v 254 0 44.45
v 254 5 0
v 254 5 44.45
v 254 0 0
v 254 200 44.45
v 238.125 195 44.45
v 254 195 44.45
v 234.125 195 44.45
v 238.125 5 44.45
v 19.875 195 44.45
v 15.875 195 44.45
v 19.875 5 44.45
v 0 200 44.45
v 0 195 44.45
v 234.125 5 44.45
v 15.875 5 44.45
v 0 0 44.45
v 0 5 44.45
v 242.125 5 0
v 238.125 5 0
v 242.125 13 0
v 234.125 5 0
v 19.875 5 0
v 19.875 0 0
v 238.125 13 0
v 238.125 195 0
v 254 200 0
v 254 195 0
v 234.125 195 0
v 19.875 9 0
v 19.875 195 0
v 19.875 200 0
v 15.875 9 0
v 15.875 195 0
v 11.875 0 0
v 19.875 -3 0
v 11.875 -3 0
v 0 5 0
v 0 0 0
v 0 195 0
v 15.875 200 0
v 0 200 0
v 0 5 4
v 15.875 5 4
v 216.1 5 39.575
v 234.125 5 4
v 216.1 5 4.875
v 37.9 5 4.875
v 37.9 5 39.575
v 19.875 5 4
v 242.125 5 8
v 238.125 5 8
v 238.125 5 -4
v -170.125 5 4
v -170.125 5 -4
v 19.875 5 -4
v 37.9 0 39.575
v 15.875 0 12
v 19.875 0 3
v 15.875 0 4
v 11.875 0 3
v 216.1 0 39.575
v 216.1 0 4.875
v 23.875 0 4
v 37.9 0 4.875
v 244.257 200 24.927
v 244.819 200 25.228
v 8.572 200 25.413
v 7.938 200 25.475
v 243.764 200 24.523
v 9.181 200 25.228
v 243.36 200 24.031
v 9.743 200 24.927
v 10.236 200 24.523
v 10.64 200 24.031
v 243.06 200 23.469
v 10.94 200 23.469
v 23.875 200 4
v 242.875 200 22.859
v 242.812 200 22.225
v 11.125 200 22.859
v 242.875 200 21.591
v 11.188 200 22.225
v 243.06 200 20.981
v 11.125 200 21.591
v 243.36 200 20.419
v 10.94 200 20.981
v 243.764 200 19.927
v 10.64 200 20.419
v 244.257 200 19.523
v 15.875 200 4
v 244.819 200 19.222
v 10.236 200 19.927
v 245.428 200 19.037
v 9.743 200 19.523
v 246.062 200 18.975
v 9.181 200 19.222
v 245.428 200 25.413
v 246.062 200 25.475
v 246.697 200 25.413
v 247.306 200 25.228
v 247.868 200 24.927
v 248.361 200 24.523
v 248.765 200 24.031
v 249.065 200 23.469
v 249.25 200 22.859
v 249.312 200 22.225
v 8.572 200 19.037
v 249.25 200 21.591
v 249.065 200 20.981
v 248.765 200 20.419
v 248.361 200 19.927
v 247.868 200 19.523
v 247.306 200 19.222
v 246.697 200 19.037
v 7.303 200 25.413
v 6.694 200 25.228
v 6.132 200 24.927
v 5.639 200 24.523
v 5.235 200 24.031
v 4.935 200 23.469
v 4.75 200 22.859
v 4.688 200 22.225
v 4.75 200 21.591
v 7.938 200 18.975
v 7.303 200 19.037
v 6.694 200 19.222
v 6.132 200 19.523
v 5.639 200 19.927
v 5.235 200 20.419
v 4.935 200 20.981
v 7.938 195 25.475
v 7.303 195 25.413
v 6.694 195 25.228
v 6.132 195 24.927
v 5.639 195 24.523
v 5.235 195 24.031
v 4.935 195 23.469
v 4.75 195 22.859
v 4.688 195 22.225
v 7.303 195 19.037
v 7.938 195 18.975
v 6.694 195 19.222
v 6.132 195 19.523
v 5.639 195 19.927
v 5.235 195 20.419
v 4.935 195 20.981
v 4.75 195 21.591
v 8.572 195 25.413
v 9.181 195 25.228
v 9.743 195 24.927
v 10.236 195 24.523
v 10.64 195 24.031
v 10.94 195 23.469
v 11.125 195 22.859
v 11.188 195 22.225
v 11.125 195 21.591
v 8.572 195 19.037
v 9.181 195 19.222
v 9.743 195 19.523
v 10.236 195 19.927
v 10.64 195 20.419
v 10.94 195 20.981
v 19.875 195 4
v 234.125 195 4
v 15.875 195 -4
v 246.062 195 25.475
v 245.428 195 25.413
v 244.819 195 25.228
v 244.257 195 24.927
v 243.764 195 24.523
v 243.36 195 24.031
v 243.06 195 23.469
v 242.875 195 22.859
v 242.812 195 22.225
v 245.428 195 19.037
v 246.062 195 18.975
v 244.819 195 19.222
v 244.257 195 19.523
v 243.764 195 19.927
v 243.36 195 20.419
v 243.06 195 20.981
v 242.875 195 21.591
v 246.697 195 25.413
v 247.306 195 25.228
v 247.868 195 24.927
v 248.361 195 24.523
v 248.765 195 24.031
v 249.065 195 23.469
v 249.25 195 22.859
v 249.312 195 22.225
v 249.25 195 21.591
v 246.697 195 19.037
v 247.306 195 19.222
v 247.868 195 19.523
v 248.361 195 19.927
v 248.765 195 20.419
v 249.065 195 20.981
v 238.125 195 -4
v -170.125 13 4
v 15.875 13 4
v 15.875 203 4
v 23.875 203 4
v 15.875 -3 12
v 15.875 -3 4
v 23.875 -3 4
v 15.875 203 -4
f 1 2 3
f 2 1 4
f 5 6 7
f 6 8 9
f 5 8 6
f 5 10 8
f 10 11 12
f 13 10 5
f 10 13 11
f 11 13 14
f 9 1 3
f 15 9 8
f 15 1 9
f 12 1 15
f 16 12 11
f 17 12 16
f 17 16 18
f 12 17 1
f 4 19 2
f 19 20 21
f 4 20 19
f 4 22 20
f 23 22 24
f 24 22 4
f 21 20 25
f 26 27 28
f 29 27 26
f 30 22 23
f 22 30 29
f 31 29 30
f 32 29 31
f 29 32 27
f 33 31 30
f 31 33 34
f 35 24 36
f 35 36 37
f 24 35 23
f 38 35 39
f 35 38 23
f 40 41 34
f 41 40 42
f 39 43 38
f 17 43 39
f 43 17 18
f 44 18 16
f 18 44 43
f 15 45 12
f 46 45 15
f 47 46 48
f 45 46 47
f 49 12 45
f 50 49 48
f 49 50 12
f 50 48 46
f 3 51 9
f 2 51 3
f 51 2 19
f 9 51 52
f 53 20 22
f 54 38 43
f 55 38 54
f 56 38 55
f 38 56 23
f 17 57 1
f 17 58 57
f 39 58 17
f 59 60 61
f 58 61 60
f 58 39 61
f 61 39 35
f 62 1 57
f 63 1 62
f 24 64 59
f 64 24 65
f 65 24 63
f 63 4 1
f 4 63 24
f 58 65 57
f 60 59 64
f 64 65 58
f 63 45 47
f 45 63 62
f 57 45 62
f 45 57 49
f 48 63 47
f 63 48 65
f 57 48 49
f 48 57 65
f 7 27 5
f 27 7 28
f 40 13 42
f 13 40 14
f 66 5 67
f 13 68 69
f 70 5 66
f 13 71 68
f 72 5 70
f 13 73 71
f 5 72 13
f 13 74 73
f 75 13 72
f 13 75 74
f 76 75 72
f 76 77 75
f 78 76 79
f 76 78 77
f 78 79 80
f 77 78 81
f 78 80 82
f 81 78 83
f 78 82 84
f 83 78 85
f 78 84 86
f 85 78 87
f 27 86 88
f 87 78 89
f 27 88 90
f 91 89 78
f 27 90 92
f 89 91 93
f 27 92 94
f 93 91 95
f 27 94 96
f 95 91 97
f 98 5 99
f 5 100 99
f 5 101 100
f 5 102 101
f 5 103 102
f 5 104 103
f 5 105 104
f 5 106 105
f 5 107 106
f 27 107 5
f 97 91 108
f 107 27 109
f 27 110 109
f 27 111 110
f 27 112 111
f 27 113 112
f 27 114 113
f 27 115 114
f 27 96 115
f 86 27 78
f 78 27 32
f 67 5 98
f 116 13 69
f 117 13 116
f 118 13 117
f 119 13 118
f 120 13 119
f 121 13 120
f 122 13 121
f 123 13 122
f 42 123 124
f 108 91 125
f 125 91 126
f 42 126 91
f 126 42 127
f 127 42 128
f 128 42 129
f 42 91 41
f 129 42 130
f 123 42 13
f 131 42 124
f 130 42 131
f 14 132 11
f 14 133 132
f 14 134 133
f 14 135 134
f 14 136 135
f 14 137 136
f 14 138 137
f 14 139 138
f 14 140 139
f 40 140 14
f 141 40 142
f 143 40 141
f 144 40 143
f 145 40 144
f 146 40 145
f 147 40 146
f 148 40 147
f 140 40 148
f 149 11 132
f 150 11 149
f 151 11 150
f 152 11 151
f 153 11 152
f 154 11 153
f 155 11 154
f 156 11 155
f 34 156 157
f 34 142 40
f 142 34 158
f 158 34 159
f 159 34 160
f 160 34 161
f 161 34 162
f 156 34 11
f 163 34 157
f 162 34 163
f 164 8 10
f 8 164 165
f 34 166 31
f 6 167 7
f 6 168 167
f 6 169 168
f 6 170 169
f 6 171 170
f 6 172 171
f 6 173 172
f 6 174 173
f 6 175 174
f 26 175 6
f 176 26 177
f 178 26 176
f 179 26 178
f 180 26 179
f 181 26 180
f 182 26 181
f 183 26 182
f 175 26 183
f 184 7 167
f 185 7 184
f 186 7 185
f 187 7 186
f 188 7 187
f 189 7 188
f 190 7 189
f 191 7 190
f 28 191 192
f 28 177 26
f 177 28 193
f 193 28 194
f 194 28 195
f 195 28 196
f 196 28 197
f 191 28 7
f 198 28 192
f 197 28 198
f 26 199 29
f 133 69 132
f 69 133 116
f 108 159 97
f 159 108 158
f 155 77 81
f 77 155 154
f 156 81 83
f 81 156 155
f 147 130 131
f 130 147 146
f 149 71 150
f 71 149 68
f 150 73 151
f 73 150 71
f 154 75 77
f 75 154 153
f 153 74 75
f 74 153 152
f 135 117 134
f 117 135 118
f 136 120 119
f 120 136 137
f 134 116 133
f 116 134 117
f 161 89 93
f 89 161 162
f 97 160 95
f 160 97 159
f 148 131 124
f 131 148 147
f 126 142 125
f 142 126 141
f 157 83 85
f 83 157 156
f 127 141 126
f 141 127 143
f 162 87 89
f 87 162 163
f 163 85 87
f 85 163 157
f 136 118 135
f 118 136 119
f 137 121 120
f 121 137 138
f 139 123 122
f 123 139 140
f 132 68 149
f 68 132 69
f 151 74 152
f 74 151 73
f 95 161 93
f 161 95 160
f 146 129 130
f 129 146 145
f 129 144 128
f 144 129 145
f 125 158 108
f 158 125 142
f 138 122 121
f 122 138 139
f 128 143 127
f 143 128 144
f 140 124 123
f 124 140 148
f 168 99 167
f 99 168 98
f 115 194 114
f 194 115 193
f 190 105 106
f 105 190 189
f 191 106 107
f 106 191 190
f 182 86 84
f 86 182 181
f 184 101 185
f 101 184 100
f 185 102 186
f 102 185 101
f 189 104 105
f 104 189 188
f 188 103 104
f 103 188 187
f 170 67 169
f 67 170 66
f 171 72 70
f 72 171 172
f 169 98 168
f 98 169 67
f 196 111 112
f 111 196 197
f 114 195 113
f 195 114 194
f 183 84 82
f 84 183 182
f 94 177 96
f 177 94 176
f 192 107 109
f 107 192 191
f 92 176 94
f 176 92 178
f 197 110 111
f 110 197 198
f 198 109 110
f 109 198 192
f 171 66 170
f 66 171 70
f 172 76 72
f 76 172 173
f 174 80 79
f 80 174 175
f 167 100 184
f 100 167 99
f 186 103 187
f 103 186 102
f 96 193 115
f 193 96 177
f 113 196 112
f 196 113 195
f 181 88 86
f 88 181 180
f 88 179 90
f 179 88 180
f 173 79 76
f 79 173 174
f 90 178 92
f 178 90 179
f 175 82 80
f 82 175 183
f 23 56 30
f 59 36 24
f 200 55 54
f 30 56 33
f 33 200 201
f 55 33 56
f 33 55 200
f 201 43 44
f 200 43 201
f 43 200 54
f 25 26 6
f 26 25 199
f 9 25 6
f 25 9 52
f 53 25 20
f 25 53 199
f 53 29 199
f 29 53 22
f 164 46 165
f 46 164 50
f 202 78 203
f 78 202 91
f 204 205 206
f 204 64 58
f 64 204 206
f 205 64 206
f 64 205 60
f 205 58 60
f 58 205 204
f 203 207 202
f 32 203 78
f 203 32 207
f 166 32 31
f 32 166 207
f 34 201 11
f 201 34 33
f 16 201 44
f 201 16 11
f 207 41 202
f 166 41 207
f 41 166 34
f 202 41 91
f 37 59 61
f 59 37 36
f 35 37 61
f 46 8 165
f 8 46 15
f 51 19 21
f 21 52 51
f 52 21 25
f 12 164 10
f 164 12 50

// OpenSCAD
// ============================================================
// Lenovo ThinkCentre M93 Tiny — 10" Rack Mount (1U, 4-post)
// Single print, no supports required (print faceplate-face-down)
// ============================================================

// --- Rack dimensions ---
rack_width         = 254.0;   // 10" rack total panel width
rack_usable_width  = 222.25;  // usable width between posts
rack_1u_height     = 44.45;   // 1U panel height
post_depth         = 200.0;   // front post face to rear post face

// --- M93 Tiny dimensions (on its side) ---
m93_w              = 177.8;   // width of unit
m93_h              = 34.3;    // height of unit (sitting on side)
m93_d              = 182.0;   // depth of unit

// --- Wall / structure thicknesses ---
wall_t             = 4.0;     // general wall / floor thickness
face_t             = 5.0;     // faceplate thickness
rear_t             = 5.0;     // rear crossbar thickness
gusset_r           = 8.0;     // corner gusset radius

// --- Mounting holes ---
m6_hole_d          = 6.5;     // M6 clearance hole diameter
// Rack ear width = (rack_width - rack_usable_width) / 2 = 15.875mm each side
ear_w              = (rack_width - rack_usable_width) / 2;  // 15.875
// Hole centred in ear, centred vertically in 1U
hole_x             = ear_w / 2;                             // 7.94 from panel edge
hole_y             = rack_1u_height / 2;                    // 22.23 from bottom

// --- Derived inner cavity ---
// Inner cavity sits centred left-right within usable width
// Side walls sit on the floor, floor spans usable width
inner_w            = rack_usable_width - 2 * wall_t;        // 214.25
inner_h            = rack_1u_height - wall_t;               // 40.45 (open top)
// Tray depth from back of faceplate to back of rear crossbar
tray_d             = post_depth - face_t - rear_t;          // 190mm inner run

// M93 sits centred left-right, on the floor
m93_offset_x       = (inner_w - m93_w) / 2;                // side gap each side
m93_offset_z       = 0;                                     // sits on floor
// M93 front face flush with back of faceplate
m93_offset_y       = 0;

// ============================================================
// MODULES
// ============================================================

module gusset_fillet(length, r) {
    // 45-degree triangular gusset along Y axis
    // Place at corner, will be differenced out to round internal corners
    translate([0, 0, 0])
    rotate([90, 0, 0])
    linear_extrude(height = length)
    polygon(points = [[0, 0], [r, 0], [0, r]]);
}

module rack_ear(side) {
    // side: 0 = left, 1 = right
    mirror_x = (side == 1) ? -1 : 1;
    translate([side == 1 ? rack_width - ear_w : 0, 0, 0])
    difference() {
        cube([ear_w, face_t, rack_1u_height]);
        // M6 mounting hole
        translate([hole_x, face_t / 2, hole_y])
        rotate([90, 0, 0])
        cylinder(d = m6_hole_d, h = face_t + 1, center = true, $fn = 32);
    }
}

module rear_crossbar() {
    translate([0, post_depth - rear_t, 0])
    difference() {
        cube([rack_width, rear_t, rack_1u_height]);
        // Left M6 hole
        translate([hole_x, rear_t / 2, hole_y])
        rotate([90, 0, 0])
        cylinder(d = m6_hole_d, h = rear_t + 1, center = true, $fn = 32);
        // Right M6 hole
        translate([rack_width - hole_x, rear_t / 2, hole_y])
        rotate([90, 0, 0])
        cylinder(d = m6_hole_d, h = rear_t + 1, center = true, $fn = 32);
    }
}

module faceplate() {
    // Faceplate spans full rack width, sits at Y=0
    // Cutout: tight rectangle for M93 front face, centred left-right and vertically
    cutout_w = m93_w + 0.4;  // 0.4mm clearance each side
    cutout_h = m93_h + 0.4;
    cutout_x = (rack_width - cutout_w) / 2;
    cutout_z = (rack_1u_height - cutout_h) / 2;

    difference() {
        // Solid faceplate
        cube([rack_width, face_t, rack_1u_height]);
        // M93 front I/O cutout
        translate([cutout_x, -0.1, cutout_z])
        cube([cutout_w, face_t + 0.2, cutout_h]);
        // Left ear hole (already in rack_ear but faceplate is separate solid here
        // — holes handled in rack_ear module which is unioned)
    }
}

module side_wall(side) {
    // side: 0 = left, 1 = right
    // Walls run from back of faceplate to front of rear crossbar
    wall_run = post_depth - face_t - rear_t;  // 190mm
    x_pos = (side == 0) ? ear_w : rack_width - ear_w - wall_t;
    translate([x_pos, face_t, 0])
    cube([wall_t, wall_run, rack_1u_height]);
}

module floor_panel() {
    // Floor spans usable width, runs full tray depth (faceplate back to rear crossbar front)
    floor_run = post_depth - face_t - rear_t;
    translate([ear_w, face_t, 0])
    cube([rack_usable_width, floor_run, wall_t]);
}

module gussets() {
    gusset_run = post_depth - face_t - rear_t;

    // Floor-to-left-wall gusset (internal, along Y)
    translate([ear_w + wall_t, face_t, wall_t])
    rotate([0, -90, 0])
    rotate([0, 0, 90])
    linear_extrude(height = gusset_run)
    polygon(points = [[0,0],[gusset_r,0],[0,gusset_r]]);

    // Floor-to-right-wall gusset
    translate([rack_width - ear_w, face_t, wall_t])
    rotate([0, 0, 90])
    rotate([0, 90, 0])
    linear_extrude(height = gusset_run)
    polygon(points = [[0,0],[gusset_r,0],[0,gusset_r]]);

    // Faceplate-to-floor gusset (across full usable width)
    translate([ear_w, face_t, wall_t])
    rotate([90, 0, 0])
    linear_extrude(height = gusset_r)
    polygon(points = [[0,0],[gusset_r,0],[0,gusset_r]]);

    // Rear crossbar-to-floor gusset
    translate([ear_w, post_depth - rear_t, wall_t])
    rotate([-90, 0, 0])
    linear_extrude(height = gusset_r)
    polygon(points = [[0,0],[gusset_r,0],[0,gusset_r]]);

    // Faceplate-to-left-wall gusset
    translate([ear_w + wall_t, face_t, 0])
    rotate([90, 0, -90])
    linear_extrude(height = gusset_r)
    polygon(points = [[0,0],[gusset_r,0],[0,gusset_r]]);

    // Faceplate-to-right-wall gusset
    translate([rack_width - ear_w - wall_t, face_t, 0])
    rotate([90, 0, 90])
    linear_extrude(height = gusset_r)
    polygon(points = [[0,0],[gusset_r,0],[0,gusset_r]]);
}

// ============================================================
// ASSEMBLY
// ============================================================

union() {
    faceplate();
    rack_ear(0);
    rack_ear(1);
    rear_crossbar();
    side_wall(0);
    side_wall(1);
    floor_panel();
    gussets();
}

// ============================================================
// PREVIEW GHOST: M93 unit position (comment out before export)
// ============================================================
// Uncomment to visualise M93 placement:
/*
%translate([
    ear_w + wall_t + m93_offset_x,
    face_t,
    wall_t
])
cube([m93_w, m93_d, m93_h]);
*/
